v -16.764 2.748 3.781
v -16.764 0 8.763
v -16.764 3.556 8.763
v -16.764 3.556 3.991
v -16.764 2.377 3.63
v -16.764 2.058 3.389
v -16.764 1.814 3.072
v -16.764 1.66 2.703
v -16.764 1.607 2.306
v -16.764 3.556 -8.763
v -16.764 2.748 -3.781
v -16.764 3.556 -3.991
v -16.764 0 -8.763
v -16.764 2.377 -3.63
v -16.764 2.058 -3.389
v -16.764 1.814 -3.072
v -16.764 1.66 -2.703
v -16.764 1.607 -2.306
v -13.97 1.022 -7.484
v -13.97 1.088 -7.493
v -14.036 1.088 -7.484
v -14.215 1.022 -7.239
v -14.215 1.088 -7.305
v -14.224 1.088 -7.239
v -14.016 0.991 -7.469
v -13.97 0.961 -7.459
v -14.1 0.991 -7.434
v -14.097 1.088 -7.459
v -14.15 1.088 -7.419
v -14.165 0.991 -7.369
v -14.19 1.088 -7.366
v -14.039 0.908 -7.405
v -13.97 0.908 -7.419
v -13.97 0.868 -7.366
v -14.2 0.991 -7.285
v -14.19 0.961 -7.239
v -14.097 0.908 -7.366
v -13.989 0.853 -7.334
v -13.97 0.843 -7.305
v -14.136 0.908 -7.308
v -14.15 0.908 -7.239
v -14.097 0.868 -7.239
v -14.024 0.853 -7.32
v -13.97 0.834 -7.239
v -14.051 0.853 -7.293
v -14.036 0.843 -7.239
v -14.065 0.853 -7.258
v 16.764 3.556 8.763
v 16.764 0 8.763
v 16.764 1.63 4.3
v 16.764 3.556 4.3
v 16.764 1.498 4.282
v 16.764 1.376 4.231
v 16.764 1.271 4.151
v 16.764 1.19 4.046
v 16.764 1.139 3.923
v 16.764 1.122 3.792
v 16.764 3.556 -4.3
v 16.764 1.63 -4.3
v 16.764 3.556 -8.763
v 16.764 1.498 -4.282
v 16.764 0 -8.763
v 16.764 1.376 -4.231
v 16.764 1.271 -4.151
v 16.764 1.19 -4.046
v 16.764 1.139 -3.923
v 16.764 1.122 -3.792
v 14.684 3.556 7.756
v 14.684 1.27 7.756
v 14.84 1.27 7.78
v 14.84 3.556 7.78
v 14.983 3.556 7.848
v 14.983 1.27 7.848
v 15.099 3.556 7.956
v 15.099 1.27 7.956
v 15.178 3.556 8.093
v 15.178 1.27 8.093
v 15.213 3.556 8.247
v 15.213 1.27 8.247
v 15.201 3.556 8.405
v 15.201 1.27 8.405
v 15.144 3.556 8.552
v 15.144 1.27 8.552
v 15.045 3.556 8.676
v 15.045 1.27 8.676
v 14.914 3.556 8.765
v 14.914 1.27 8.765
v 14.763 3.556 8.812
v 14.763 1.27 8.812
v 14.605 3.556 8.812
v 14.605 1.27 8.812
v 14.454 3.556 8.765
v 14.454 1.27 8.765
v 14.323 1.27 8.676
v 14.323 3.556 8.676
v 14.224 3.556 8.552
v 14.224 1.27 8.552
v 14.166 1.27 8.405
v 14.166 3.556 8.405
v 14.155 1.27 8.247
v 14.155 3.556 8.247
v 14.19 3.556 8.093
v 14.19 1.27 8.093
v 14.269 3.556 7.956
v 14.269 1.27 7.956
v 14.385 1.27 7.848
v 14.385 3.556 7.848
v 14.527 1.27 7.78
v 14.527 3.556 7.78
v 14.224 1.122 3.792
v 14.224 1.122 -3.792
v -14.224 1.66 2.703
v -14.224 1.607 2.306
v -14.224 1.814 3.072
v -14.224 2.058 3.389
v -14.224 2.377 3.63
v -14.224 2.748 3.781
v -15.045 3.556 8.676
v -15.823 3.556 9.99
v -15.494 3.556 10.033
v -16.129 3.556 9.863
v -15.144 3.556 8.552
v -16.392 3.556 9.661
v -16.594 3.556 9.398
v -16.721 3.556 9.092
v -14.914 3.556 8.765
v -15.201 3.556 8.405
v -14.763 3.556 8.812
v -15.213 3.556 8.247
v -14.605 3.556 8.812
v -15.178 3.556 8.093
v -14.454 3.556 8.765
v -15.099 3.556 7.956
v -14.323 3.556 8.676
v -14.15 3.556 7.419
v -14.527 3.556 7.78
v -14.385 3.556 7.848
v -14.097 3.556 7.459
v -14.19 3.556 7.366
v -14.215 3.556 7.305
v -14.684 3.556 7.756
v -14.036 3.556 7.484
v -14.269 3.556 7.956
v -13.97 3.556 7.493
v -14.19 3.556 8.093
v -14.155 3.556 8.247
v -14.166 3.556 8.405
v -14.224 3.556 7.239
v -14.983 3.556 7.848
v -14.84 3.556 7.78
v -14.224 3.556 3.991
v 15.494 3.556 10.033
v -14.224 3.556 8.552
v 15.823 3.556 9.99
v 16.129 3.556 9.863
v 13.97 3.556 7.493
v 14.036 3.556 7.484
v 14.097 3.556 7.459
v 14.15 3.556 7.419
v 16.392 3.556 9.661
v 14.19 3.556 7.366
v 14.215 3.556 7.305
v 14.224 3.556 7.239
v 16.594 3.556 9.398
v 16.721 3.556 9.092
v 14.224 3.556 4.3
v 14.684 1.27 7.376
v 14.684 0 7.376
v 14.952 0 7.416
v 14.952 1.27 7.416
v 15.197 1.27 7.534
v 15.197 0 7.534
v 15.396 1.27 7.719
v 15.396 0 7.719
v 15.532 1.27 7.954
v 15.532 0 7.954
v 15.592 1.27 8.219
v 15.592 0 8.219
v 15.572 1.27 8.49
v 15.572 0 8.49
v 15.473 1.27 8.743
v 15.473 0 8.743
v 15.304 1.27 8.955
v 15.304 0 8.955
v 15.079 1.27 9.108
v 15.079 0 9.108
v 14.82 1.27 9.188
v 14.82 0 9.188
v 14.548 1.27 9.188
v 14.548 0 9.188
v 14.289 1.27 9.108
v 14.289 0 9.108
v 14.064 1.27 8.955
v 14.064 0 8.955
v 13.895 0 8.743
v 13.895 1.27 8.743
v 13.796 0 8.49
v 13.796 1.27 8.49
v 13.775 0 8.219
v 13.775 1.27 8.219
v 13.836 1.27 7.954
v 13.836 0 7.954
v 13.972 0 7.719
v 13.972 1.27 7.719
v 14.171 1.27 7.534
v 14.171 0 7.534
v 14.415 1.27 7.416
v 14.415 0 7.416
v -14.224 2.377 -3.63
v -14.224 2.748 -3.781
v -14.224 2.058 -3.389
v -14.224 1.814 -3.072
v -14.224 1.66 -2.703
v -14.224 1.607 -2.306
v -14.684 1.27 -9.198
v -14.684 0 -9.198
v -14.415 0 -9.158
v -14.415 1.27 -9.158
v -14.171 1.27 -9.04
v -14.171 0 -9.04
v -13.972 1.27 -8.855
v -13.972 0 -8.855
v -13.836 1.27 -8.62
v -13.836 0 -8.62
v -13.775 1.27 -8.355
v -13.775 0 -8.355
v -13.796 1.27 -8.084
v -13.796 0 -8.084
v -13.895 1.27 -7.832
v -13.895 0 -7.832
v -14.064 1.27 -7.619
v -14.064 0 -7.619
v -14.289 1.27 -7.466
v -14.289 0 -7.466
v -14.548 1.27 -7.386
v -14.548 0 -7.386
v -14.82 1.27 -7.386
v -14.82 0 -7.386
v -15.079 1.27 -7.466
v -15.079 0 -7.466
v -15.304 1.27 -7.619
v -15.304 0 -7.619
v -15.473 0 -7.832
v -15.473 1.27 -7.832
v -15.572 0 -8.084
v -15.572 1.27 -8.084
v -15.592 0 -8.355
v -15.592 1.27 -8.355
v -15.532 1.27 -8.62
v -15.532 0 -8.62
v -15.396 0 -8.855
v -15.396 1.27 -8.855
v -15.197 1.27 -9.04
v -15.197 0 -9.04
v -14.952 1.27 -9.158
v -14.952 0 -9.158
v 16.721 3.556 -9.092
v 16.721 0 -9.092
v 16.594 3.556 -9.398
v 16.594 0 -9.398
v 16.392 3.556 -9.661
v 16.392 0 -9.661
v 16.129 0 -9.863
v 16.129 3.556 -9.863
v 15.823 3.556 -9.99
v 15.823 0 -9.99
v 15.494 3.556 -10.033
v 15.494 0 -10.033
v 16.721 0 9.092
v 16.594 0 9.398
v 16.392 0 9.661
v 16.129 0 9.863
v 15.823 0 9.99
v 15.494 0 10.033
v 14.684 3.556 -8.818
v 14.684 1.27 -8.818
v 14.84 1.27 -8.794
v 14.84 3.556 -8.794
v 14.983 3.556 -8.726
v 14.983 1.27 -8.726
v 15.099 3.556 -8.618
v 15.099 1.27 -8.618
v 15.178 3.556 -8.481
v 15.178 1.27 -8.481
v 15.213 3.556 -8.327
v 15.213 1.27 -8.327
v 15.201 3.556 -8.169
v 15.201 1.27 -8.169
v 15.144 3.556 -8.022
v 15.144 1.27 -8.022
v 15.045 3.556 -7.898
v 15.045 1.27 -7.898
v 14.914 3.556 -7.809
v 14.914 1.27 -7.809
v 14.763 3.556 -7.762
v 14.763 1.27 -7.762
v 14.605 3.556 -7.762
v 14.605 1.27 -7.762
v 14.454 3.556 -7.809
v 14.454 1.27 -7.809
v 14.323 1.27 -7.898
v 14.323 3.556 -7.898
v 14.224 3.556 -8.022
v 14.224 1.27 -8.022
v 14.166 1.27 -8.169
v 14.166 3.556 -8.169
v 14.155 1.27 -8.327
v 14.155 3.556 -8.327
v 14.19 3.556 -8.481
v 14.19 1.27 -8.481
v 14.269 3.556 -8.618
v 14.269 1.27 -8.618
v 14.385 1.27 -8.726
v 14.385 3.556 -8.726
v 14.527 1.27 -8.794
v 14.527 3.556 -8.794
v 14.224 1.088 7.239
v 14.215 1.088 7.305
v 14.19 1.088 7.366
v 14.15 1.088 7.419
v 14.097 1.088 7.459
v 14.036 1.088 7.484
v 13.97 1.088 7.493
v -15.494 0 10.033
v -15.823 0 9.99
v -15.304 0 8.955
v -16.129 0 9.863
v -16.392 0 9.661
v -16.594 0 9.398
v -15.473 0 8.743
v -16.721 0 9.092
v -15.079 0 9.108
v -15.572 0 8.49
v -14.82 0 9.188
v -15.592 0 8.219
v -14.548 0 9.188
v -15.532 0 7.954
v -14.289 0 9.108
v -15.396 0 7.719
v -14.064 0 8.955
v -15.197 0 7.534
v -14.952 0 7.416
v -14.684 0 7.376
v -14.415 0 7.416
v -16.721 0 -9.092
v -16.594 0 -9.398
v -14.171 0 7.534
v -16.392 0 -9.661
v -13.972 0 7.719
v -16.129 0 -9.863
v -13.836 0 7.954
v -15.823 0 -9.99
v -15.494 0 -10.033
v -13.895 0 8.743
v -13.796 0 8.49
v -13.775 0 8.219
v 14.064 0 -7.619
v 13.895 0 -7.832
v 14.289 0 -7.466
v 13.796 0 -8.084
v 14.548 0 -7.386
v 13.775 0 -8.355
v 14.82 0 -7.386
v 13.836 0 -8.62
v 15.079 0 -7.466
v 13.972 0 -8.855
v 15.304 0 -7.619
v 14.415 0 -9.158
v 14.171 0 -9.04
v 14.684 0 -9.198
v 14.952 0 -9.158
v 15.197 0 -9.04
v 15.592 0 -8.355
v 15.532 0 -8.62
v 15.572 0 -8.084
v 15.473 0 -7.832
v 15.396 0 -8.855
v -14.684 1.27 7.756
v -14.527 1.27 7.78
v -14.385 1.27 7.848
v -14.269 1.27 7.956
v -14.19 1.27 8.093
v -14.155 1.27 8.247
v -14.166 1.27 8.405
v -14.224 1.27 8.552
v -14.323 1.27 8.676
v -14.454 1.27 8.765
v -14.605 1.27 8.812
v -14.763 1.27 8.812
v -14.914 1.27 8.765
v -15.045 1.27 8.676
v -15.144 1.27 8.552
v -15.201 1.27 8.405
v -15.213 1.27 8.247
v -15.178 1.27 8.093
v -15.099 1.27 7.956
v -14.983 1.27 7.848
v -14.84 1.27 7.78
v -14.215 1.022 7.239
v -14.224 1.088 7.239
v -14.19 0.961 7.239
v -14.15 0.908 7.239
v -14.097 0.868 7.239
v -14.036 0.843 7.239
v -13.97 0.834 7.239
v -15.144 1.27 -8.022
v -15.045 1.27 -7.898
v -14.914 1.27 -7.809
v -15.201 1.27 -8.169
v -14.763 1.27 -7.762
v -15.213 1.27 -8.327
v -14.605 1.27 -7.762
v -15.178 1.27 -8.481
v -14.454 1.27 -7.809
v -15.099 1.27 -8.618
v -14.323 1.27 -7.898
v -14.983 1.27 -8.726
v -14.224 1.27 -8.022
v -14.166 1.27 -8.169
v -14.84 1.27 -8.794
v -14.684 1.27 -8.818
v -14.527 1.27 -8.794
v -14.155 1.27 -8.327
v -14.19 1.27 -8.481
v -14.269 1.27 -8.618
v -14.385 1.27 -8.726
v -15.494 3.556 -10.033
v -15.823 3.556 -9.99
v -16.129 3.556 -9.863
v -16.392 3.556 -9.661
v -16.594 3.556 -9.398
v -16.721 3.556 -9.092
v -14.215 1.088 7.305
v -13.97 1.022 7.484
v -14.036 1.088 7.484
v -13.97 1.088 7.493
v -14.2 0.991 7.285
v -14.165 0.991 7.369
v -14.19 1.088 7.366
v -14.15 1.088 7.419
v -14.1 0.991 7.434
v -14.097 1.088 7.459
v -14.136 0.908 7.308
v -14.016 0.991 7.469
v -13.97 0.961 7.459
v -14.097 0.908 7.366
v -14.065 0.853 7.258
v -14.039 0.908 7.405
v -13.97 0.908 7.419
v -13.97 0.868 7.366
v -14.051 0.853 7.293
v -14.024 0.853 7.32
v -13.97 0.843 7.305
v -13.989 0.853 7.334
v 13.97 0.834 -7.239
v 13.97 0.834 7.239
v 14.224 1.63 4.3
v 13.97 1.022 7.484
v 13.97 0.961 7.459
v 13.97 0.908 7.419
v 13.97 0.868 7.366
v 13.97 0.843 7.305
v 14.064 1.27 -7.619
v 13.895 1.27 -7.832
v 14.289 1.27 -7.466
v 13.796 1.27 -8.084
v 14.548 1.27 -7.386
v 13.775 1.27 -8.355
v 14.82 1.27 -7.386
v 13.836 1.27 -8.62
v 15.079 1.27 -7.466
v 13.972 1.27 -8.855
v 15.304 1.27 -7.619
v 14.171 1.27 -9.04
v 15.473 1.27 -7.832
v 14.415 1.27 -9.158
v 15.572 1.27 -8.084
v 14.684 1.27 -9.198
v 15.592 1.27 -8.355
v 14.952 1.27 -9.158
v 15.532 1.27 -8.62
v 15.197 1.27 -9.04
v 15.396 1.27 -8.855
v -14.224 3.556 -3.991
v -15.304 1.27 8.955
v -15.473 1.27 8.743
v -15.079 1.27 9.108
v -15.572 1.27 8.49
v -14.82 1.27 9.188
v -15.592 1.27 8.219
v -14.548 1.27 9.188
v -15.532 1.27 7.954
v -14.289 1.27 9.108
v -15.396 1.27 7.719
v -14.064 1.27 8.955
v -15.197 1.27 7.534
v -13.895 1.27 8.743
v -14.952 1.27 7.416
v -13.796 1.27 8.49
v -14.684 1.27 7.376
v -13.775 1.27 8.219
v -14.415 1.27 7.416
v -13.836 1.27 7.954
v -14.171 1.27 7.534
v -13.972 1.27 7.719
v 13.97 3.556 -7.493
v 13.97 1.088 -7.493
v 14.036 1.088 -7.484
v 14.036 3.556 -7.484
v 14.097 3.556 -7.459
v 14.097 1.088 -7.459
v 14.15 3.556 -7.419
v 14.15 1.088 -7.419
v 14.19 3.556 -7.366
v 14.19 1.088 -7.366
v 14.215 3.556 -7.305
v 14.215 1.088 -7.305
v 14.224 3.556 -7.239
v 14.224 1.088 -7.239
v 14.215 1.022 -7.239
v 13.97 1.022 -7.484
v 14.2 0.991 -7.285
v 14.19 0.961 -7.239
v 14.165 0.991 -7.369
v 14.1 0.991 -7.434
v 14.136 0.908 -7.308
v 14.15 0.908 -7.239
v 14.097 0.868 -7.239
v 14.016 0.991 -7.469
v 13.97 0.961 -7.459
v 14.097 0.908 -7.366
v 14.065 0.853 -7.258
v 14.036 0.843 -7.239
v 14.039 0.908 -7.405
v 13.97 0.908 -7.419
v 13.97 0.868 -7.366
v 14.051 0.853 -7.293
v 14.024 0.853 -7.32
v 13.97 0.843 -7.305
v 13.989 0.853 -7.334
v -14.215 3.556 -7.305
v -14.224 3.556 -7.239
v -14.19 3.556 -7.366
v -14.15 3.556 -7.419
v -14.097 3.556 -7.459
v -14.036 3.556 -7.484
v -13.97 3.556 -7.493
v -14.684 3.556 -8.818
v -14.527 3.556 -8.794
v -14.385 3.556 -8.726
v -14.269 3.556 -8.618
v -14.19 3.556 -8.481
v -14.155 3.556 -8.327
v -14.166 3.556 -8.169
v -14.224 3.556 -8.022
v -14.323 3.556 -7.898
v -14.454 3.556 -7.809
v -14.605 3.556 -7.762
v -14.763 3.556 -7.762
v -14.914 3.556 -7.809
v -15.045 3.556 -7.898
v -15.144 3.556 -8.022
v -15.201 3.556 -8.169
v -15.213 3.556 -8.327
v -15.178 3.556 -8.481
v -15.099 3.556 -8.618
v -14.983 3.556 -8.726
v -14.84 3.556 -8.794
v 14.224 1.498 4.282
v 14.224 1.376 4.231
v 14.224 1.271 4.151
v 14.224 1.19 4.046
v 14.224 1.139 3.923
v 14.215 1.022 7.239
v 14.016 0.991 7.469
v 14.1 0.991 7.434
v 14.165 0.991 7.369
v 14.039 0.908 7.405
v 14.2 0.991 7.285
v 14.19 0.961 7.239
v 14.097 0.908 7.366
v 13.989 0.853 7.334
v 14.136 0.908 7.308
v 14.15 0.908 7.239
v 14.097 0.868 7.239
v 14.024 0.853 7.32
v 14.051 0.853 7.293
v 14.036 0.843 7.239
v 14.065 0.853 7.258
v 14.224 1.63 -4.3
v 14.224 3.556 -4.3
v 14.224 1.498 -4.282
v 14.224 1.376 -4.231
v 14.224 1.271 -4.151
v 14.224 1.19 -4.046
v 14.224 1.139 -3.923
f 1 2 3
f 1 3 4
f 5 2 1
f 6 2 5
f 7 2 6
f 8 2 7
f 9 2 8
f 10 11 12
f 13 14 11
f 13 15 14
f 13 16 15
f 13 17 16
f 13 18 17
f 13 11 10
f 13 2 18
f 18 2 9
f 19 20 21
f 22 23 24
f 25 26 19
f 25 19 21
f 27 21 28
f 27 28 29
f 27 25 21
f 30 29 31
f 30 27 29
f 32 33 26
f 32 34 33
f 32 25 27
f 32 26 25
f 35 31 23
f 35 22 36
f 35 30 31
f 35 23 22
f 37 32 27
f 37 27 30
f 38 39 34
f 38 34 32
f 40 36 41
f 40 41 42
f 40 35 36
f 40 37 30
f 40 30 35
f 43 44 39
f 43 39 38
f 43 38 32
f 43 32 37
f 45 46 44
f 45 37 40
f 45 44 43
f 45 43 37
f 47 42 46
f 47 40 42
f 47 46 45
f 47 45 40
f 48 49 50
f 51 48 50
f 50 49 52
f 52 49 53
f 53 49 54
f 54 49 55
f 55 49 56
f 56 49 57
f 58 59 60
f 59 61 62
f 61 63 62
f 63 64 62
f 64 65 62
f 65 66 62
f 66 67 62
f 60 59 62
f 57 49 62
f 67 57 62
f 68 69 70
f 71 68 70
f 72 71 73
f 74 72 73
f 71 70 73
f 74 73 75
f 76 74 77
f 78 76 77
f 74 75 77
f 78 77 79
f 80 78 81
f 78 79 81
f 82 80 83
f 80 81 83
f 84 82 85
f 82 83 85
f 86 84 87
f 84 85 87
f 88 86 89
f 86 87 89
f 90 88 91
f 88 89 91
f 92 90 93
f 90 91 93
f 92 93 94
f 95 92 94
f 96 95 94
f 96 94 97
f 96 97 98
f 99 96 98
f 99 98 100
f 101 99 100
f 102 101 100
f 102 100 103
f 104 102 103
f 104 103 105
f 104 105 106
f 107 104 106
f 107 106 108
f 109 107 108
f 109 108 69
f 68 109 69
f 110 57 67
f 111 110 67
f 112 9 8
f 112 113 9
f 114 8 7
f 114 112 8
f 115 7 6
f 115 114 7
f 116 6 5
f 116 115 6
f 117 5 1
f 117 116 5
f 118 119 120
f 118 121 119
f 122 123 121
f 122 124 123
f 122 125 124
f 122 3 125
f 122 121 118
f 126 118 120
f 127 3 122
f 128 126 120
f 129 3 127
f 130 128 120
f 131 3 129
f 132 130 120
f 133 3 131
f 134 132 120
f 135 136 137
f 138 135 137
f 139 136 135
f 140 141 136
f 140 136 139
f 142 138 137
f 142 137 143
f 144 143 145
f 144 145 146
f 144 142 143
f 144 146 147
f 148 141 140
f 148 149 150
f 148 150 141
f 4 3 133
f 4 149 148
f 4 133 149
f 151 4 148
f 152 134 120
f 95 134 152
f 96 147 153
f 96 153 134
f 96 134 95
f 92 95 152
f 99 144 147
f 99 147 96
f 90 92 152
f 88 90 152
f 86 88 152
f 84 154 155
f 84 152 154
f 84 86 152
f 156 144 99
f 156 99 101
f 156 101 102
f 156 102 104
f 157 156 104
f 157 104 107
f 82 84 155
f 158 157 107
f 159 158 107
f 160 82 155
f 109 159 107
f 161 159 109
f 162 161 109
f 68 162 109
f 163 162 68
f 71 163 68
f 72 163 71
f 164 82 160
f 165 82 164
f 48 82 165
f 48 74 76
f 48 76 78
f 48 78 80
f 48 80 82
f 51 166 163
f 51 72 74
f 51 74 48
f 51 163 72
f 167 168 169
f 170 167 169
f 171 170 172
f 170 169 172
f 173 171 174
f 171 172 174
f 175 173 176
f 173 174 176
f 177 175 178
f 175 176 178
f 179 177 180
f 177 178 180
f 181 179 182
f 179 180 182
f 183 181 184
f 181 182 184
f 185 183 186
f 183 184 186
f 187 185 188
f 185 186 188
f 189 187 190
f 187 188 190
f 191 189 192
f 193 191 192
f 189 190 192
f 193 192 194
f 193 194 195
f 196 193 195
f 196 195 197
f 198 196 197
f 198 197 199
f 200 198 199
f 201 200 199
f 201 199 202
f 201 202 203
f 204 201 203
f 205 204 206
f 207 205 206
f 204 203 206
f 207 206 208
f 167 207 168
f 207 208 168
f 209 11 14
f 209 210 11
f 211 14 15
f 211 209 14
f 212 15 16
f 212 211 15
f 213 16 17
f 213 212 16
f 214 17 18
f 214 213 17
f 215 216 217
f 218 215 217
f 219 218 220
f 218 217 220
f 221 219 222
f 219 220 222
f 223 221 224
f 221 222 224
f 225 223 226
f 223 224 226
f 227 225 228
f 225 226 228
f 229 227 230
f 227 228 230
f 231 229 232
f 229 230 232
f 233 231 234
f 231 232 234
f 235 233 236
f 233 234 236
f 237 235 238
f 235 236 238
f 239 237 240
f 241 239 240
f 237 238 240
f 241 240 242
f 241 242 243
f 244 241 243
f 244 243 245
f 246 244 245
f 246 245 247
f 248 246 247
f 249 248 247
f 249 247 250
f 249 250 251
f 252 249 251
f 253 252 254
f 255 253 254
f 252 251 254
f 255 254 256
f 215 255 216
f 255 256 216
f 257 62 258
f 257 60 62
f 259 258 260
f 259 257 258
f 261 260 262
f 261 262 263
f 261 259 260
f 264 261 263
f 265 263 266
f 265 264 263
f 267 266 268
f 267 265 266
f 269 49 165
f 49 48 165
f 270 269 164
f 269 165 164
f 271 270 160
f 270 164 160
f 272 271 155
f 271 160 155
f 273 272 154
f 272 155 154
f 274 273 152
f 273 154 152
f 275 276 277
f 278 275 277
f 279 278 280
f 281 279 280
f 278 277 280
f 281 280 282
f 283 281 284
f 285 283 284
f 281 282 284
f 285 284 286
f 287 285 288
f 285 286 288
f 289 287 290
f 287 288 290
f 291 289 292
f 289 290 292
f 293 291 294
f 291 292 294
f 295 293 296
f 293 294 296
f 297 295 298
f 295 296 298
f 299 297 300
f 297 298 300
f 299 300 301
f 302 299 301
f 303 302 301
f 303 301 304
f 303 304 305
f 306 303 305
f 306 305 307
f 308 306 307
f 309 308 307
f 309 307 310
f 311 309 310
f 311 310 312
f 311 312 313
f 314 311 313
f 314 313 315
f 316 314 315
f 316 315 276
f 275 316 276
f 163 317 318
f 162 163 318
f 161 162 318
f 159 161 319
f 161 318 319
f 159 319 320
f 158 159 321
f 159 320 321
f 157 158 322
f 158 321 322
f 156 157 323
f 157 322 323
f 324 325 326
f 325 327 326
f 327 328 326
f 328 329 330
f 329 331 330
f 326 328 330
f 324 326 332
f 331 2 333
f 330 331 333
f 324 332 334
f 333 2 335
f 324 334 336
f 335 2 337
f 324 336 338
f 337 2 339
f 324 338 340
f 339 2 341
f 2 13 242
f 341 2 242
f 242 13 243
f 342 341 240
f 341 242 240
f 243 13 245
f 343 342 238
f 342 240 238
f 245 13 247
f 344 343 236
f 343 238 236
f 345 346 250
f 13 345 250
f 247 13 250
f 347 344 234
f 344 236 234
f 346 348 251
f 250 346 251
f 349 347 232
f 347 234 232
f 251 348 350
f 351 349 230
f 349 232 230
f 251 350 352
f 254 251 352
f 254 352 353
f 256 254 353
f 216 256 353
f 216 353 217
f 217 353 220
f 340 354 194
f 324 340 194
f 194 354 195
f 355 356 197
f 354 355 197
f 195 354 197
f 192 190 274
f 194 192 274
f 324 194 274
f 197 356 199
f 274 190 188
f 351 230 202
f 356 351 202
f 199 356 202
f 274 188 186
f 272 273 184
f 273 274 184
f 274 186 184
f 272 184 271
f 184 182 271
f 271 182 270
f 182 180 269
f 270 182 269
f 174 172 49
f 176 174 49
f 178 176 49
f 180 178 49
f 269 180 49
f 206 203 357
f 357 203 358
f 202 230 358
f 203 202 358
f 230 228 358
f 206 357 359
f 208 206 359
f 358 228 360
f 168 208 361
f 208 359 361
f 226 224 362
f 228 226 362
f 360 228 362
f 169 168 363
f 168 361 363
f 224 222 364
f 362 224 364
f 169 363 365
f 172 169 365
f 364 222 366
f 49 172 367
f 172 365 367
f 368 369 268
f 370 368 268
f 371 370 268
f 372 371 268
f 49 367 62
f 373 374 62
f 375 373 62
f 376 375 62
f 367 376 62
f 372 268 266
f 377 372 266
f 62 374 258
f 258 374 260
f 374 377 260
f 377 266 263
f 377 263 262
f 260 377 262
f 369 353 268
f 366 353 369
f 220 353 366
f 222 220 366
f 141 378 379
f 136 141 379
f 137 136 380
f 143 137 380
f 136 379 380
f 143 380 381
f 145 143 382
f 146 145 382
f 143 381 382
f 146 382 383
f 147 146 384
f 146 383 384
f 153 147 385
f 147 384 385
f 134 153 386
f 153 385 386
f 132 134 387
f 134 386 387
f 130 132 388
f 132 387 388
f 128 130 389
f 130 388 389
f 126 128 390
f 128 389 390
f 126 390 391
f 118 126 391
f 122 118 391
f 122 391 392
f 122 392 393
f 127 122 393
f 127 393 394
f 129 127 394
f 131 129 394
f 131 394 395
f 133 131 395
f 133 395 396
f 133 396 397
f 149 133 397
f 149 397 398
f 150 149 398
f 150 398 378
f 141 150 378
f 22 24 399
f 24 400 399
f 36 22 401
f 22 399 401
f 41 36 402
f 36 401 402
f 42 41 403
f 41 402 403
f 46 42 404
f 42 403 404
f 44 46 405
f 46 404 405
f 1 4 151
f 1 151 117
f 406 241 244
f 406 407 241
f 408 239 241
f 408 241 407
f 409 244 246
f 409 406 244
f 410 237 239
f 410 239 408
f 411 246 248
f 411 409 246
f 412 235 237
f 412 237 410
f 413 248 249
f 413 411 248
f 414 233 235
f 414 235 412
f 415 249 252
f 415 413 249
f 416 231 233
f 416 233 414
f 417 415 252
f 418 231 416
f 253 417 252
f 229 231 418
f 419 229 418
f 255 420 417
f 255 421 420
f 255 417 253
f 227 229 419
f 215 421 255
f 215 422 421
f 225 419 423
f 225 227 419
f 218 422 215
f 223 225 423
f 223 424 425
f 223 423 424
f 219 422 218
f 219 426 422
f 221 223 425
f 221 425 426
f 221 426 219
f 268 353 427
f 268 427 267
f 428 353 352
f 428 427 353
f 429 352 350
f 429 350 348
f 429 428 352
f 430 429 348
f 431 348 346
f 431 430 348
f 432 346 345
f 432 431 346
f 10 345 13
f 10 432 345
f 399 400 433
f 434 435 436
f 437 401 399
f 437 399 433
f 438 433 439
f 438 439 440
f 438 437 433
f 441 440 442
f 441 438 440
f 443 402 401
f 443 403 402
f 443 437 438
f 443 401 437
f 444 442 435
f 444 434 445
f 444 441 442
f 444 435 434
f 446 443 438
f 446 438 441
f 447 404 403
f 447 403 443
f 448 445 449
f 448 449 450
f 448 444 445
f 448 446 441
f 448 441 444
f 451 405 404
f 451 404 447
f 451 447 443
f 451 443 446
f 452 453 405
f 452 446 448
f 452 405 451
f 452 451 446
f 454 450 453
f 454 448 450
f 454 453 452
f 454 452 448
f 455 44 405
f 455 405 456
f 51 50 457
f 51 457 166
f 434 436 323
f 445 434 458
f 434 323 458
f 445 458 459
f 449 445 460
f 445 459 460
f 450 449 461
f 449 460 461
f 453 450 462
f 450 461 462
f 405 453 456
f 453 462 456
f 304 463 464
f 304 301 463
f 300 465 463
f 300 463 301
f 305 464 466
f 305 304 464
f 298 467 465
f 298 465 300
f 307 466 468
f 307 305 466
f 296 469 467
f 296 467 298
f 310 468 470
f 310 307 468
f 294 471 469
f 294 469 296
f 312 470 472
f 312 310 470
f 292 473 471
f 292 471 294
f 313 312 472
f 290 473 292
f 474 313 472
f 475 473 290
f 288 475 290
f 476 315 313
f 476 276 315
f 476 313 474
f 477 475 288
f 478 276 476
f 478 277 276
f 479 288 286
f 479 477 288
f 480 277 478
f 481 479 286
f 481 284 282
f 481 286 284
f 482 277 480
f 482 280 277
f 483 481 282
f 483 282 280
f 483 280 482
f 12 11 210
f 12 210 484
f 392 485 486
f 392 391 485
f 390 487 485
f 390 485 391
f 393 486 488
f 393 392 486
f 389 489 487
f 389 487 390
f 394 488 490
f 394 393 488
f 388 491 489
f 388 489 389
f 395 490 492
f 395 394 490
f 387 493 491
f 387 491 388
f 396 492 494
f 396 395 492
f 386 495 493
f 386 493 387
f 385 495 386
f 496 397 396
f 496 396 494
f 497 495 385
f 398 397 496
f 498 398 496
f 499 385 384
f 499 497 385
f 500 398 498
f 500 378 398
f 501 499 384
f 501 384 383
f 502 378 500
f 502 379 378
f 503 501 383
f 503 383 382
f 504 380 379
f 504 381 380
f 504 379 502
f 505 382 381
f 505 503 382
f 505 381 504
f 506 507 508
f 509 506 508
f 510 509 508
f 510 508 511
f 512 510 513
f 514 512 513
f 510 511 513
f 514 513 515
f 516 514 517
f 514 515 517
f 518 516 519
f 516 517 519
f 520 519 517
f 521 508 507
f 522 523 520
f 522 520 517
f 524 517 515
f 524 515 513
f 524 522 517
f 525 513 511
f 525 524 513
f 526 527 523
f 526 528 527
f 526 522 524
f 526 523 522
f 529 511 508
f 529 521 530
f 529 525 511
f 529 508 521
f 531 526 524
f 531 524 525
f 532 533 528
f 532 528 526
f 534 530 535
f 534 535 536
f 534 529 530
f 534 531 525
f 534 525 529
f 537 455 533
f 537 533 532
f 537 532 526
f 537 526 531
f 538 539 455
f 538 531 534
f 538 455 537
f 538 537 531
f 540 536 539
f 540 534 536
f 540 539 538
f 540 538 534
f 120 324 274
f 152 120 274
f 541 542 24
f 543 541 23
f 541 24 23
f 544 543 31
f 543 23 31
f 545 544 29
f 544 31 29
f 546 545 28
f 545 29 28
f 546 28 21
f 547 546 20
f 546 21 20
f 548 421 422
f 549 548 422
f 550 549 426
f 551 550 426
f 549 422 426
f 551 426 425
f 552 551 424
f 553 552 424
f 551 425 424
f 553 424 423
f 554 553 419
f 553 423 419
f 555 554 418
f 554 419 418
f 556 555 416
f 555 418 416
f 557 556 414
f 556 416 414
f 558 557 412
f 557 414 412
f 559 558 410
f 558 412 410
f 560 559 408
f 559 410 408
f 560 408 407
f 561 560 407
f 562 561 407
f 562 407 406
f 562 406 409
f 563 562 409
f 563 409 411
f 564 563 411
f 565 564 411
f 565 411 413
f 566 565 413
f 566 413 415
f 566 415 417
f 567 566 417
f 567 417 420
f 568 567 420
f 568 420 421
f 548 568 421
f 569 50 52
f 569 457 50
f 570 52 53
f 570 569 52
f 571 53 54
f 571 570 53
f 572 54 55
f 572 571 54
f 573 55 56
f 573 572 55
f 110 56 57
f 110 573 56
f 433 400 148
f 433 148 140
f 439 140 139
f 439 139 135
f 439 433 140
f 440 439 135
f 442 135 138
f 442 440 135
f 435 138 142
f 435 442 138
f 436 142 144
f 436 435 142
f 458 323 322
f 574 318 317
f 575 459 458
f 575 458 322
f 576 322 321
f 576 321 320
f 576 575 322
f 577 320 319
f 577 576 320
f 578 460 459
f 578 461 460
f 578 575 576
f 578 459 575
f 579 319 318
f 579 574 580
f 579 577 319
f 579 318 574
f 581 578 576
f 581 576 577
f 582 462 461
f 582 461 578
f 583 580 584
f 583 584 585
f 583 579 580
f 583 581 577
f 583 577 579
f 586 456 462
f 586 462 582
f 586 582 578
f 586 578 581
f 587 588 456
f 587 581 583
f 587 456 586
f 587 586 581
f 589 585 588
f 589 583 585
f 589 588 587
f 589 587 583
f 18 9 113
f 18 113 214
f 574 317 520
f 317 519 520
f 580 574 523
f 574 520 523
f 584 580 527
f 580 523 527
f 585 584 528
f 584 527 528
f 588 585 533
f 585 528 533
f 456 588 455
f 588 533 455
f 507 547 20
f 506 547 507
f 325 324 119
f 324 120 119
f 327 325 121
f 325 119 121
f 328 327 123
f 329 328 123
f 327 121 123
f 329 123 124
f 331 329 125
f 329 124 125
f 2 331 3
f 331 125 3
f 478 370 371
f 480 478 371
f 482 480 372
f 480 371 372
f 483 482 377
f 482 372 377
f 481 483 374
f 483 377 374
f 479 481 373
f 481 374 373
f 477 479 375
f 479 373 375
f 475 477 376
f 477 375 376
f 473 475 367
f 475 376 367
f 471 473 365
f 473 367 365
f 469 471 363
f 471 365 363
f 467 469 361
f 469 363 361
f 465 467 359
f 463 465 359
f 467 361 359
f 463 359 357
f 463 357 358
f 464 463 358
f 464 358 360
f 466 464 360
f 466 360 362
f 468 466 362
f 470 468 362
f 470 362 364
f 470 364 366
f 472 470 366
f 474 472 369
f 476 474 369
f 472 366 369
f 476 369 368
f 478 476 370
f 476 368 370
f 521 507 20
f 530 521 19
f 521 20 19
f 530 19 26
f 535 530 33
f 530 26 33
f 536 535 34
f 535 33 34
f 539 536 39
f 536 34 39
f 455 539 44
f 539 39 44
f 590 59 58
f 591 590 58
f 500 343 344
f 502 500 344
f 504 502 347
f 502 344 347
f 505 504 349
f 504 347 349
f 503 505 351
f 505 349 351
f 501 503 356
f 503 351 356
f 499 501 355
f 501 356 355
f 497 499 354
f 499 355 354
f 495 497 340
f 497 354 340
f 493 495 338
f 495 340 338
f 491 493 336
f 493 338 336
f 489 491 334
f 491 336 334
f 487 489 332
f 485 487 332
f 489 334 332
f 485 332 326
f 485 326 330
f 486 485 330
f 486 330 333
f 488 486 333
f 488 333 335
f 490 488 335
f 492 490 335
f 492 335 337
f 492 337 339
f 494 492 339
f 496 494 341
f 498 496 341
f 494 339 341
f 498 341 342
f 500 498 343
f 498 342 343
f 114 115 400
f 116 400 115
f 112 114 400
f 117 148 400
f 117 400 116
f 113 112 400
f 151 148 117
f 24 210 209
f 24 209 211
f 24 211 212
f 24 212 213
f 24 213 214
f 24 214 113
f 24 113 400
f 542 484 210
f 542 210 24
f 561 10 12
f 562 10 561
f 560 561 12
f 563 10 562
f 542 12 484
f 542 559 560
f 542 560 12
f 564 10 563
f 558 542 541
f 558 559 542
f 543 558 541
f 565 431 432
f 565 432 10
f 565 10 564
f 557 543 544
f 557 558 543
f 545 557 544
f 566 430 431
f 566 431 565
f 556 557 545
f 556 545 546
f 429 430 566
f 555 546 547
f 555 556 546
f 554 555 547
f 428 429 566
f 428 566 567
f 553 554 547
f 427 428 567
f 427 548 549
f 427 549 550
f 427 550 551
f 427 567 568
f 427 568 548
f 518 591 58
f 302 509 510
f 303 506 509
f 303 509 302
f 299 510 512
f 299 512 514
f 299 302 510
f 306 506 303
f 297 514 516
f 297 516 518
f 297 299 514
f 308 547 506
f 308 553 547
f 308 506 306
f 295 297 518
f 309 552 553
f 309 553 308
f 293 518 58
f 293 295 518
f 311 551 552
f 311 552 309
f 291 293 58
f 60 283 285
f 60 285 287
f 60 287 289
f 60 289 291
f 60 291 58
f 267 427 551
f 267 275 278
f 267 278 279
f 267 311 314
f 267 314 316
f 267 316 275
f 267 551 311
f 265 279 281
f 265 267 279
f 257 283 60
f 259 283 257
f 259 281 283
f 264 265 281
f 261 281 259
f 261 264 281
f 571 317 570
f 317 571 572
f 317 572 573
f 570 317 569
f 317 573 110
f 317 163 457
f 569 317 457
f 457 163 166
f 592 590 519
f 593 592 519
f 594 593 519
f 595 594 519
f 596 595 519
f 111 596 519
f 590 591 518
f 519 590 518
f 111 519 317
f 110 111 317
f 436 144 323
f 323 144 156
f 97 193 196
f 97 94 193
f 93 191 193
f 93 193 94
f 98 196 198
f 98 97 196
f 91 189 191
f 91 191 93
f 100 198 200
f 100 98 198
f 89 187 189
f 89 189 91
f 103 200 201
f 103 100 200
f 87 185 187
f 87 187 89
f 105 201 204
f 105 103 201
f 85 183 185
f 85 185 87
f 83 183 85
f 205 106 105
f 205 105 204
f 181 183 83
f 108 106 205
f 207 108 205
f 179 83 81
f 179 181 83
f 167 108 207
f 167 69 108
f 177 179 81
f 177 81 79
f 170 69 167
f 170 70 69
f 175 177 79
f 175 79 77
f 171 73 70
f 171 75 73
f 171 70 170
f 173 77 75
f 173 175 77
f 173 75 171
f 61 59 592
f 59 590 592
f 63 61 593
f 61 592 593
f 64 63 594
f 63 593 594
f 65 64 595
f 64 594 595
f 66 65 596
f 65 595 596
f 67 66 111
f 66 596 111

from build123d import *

# Parameters (mm, degrees)
SKETCH1_W           = 33.528
SKETCH1_H           = 20.066
BOSS_EXTRUDE1_DEPTH = 3.556
SKETCH2_W           = 28.448
SKETCH2_H           = 14.986
CUT_EXTRUDE1_DEPTH  = 2.72199989
CUT_EXTRUDE2_REACH  = 37.177
SKETCH3_W           = 8.599089176
SKETCH3_H           = 2.434237831
CUT_EXTRUDE3_REACH  = 37.177
FILLET1_R           = 1.524
FILLET2_R           = 0.508
FILLET3_R           = 1.27
SKETCH7_R           = 0.911071032
CUT_EXTRUDE4_DEPTH  = 1.27
SKETCH9_R           = 0.530860858
CUT_EXTRUDE5_DEPTH  = 20.857943524
FILLET4_R           = 0.254
FILLET5_R           = 0.254


with BuildPart() as part:
    # Sketch1 → Boss-Extrude1 (new body)
    with BuildSketch(Plane(origin=(0, 0, 0), x_dir=(1, 0, 0), z_dir=(0, 1, 0))):
        Rectangle(SKETCH1_W, SKETCH1_H)
    extrude(amount=BOSS_EXTRUDE1_DEPTH)

    # Sketch2 → Cut-Extrude1 (cut)
    with BuildSketch(Plane(origin=(0, 3.556, 0), x_dir=(1, 0, 0), z_dir=(0, 1, 0))):
        Rectangle(SKETCH2_W, SKETCH2_H)
    extrude(amount=-CUT_EXTRUDE1_DEPTH, mode=Mode.SUBTRACT)

    # Sketch3 → Cut-Extrude2 (cut, up to next)
    with BuildSketch(Plane(origin=(16.764, 0, 0), x_dir=(0, 0, -1), z_dir=(1, 0, 0)), mode=Mode.PRIVATE) as cut_extrude2_sk1:
        with Locations((0, 2.338881085)):
            Rectangle(SKETCH3_W, SKETCH3_H)
    cut_extrude2_tool1 = extrude(cut_extrude2_sk1.sketch, amount=-CUT_EXTRUDE2_REACH, mode=Mode.PRIVATE) & part.part
    add(cut_extrude2_tool1.solids().sort_by_distance((16.764, 2.338881, 0))[0], mode=Mode.SUBTRACT)

    # Sketch5 → Cut-Extrude3 (cut, up to next)
    with BuildSketch(Plane.ZY.offset(16.764), mode=Mode.PRIVATE) as cut_extrude3_sk1:
        Polygon((-3.991394218, 3.556), (3.991394218, 3.556), (3.484543993, 1.607179709), (-3.484543993, 1.607179709), align=None)
    cut_extrude3_tool1 = extrude(cut_extrude3_sk1.sketch, amount=-CUT_EXTRUDE3_REACH, mode=Mode.PRIVATE) & part.part
    add(cut_extrude3_tool1.solids().sort_by_distance((-16.764, 2.603611, 0))[0], mode=Mode.SUBTRACT)

    # Fillet1
    fillet1_edges = [part.edges().sort_by_distance(p)[0] for p in [
        (-15.494, 1.607179709, -3.484543993),
        (-15.494, 1.607179709, 3.484543993),
    ]]
    fillet(fillet1_edges, radius=FILLET1_R)

    # Fillet2
    fillet2_edges = [part.edges().sort_by_distance(p)[0] for p in [
        (15.494, 1.121762169, 4.299544588),
        (15.494, 1.121762169, -4.299544588),
    ]]
    fillet(fillet2_edges, radius=FILLET2_R)

    # Fillet3
    fillet3_edges = [part.edges().sort_by_distance(p)[0] for p in [
        (16.764, 1.778, 10.033),
        (-16.764, 1.778, 10.033),
        (-16.764, 1.778, -10.033),
        (16.764, 1.778, -10.033),
    ]]
    fillet(fillet3_edges, radius=FILLET3_R)

    # Sketch7 → Cut-Extrude4 (cut)
    with BuildSketch(Plane.XZ):
        with Locations(Location((-14.683903523, 8.287062989, 0), (0, 0, 270))):
            Circle(SKETCH7_R)
        with Locations(Location((14.683903523, 8.287062989, 0), (0, 0, 270))):
            Circle(SKETCH7_R)
        with Locations(Location((14.683903523, -8.287062989, 0), (0, 0, 270))):
            Circle(SKETCH7_R)
        with Locations(Location((-14.683903523, -8.287062989, 0), (0, 0, 270))):
            Circle(SKETCH7_R)
    extrude(amount=-CUT_EXTRUDE4_DEPTH, mode=Mode.SUBTRACT)

    # Sketch9 → Cut-Extrude5 (cut, through all)
    with BuildSketch(Plane.XZ):
        with Locations(Location((-14.683903523, 8.287062989, 0), (0, 0, 270))):
            Circle(SKETCH9_R)
        with Locations(Location((14.683903523, 8.287062989, 0), (0, 0, 270))):
            Circle(SKETCH9_R)
        with Locations(Location((14.683903523, -8.287062989, 0), (0, 0, 270))):
            Circle(SKETCH9_R)
        with Locations(Location((-14.683903523, -8.287062989, 0), (0, 0, 270))):
            Circle(SKETCH9_R)
    extrude(amount=-CUT_EXTRUDE5_DEPTH, mode=Mode.SUBTRACT)

    # Fillet4
    fillet4_edges = [part.edges().sort_by_distance(p)[0] for p in [
        (14.224, 2.195000055, -7.493),
        (14.224, 2.195000055, 7.493),
        (-14.224, 2.195000055, 7.493),
        (-14.224, 2.195000055, -7.493),
    ]]
    fillet(fillet4_edges, radius=FILLET4_R)

    # Fillet5
    fillet5_edges = [part.edges().sort_by_distance(p)[0] for p in [
        (14.224, 0.83400011, 0),
        (0, 0.83400011, 7.493),
        (0, 0.83400011, -7.493),
        (-14.224, 0.83400011, 0),
        (-14.149605122, 0.83400011, -7.418605122),
        (14.149605122, 0.83400011, -7.418605122),
        (-14.149605122, 0.83400011, 7.418605122),
        (14.149605122, 0.83400011, 7.418605122),
    ]]
    fillet(fillet5_edges, radius=FILLET5_R)


solid = part.part
